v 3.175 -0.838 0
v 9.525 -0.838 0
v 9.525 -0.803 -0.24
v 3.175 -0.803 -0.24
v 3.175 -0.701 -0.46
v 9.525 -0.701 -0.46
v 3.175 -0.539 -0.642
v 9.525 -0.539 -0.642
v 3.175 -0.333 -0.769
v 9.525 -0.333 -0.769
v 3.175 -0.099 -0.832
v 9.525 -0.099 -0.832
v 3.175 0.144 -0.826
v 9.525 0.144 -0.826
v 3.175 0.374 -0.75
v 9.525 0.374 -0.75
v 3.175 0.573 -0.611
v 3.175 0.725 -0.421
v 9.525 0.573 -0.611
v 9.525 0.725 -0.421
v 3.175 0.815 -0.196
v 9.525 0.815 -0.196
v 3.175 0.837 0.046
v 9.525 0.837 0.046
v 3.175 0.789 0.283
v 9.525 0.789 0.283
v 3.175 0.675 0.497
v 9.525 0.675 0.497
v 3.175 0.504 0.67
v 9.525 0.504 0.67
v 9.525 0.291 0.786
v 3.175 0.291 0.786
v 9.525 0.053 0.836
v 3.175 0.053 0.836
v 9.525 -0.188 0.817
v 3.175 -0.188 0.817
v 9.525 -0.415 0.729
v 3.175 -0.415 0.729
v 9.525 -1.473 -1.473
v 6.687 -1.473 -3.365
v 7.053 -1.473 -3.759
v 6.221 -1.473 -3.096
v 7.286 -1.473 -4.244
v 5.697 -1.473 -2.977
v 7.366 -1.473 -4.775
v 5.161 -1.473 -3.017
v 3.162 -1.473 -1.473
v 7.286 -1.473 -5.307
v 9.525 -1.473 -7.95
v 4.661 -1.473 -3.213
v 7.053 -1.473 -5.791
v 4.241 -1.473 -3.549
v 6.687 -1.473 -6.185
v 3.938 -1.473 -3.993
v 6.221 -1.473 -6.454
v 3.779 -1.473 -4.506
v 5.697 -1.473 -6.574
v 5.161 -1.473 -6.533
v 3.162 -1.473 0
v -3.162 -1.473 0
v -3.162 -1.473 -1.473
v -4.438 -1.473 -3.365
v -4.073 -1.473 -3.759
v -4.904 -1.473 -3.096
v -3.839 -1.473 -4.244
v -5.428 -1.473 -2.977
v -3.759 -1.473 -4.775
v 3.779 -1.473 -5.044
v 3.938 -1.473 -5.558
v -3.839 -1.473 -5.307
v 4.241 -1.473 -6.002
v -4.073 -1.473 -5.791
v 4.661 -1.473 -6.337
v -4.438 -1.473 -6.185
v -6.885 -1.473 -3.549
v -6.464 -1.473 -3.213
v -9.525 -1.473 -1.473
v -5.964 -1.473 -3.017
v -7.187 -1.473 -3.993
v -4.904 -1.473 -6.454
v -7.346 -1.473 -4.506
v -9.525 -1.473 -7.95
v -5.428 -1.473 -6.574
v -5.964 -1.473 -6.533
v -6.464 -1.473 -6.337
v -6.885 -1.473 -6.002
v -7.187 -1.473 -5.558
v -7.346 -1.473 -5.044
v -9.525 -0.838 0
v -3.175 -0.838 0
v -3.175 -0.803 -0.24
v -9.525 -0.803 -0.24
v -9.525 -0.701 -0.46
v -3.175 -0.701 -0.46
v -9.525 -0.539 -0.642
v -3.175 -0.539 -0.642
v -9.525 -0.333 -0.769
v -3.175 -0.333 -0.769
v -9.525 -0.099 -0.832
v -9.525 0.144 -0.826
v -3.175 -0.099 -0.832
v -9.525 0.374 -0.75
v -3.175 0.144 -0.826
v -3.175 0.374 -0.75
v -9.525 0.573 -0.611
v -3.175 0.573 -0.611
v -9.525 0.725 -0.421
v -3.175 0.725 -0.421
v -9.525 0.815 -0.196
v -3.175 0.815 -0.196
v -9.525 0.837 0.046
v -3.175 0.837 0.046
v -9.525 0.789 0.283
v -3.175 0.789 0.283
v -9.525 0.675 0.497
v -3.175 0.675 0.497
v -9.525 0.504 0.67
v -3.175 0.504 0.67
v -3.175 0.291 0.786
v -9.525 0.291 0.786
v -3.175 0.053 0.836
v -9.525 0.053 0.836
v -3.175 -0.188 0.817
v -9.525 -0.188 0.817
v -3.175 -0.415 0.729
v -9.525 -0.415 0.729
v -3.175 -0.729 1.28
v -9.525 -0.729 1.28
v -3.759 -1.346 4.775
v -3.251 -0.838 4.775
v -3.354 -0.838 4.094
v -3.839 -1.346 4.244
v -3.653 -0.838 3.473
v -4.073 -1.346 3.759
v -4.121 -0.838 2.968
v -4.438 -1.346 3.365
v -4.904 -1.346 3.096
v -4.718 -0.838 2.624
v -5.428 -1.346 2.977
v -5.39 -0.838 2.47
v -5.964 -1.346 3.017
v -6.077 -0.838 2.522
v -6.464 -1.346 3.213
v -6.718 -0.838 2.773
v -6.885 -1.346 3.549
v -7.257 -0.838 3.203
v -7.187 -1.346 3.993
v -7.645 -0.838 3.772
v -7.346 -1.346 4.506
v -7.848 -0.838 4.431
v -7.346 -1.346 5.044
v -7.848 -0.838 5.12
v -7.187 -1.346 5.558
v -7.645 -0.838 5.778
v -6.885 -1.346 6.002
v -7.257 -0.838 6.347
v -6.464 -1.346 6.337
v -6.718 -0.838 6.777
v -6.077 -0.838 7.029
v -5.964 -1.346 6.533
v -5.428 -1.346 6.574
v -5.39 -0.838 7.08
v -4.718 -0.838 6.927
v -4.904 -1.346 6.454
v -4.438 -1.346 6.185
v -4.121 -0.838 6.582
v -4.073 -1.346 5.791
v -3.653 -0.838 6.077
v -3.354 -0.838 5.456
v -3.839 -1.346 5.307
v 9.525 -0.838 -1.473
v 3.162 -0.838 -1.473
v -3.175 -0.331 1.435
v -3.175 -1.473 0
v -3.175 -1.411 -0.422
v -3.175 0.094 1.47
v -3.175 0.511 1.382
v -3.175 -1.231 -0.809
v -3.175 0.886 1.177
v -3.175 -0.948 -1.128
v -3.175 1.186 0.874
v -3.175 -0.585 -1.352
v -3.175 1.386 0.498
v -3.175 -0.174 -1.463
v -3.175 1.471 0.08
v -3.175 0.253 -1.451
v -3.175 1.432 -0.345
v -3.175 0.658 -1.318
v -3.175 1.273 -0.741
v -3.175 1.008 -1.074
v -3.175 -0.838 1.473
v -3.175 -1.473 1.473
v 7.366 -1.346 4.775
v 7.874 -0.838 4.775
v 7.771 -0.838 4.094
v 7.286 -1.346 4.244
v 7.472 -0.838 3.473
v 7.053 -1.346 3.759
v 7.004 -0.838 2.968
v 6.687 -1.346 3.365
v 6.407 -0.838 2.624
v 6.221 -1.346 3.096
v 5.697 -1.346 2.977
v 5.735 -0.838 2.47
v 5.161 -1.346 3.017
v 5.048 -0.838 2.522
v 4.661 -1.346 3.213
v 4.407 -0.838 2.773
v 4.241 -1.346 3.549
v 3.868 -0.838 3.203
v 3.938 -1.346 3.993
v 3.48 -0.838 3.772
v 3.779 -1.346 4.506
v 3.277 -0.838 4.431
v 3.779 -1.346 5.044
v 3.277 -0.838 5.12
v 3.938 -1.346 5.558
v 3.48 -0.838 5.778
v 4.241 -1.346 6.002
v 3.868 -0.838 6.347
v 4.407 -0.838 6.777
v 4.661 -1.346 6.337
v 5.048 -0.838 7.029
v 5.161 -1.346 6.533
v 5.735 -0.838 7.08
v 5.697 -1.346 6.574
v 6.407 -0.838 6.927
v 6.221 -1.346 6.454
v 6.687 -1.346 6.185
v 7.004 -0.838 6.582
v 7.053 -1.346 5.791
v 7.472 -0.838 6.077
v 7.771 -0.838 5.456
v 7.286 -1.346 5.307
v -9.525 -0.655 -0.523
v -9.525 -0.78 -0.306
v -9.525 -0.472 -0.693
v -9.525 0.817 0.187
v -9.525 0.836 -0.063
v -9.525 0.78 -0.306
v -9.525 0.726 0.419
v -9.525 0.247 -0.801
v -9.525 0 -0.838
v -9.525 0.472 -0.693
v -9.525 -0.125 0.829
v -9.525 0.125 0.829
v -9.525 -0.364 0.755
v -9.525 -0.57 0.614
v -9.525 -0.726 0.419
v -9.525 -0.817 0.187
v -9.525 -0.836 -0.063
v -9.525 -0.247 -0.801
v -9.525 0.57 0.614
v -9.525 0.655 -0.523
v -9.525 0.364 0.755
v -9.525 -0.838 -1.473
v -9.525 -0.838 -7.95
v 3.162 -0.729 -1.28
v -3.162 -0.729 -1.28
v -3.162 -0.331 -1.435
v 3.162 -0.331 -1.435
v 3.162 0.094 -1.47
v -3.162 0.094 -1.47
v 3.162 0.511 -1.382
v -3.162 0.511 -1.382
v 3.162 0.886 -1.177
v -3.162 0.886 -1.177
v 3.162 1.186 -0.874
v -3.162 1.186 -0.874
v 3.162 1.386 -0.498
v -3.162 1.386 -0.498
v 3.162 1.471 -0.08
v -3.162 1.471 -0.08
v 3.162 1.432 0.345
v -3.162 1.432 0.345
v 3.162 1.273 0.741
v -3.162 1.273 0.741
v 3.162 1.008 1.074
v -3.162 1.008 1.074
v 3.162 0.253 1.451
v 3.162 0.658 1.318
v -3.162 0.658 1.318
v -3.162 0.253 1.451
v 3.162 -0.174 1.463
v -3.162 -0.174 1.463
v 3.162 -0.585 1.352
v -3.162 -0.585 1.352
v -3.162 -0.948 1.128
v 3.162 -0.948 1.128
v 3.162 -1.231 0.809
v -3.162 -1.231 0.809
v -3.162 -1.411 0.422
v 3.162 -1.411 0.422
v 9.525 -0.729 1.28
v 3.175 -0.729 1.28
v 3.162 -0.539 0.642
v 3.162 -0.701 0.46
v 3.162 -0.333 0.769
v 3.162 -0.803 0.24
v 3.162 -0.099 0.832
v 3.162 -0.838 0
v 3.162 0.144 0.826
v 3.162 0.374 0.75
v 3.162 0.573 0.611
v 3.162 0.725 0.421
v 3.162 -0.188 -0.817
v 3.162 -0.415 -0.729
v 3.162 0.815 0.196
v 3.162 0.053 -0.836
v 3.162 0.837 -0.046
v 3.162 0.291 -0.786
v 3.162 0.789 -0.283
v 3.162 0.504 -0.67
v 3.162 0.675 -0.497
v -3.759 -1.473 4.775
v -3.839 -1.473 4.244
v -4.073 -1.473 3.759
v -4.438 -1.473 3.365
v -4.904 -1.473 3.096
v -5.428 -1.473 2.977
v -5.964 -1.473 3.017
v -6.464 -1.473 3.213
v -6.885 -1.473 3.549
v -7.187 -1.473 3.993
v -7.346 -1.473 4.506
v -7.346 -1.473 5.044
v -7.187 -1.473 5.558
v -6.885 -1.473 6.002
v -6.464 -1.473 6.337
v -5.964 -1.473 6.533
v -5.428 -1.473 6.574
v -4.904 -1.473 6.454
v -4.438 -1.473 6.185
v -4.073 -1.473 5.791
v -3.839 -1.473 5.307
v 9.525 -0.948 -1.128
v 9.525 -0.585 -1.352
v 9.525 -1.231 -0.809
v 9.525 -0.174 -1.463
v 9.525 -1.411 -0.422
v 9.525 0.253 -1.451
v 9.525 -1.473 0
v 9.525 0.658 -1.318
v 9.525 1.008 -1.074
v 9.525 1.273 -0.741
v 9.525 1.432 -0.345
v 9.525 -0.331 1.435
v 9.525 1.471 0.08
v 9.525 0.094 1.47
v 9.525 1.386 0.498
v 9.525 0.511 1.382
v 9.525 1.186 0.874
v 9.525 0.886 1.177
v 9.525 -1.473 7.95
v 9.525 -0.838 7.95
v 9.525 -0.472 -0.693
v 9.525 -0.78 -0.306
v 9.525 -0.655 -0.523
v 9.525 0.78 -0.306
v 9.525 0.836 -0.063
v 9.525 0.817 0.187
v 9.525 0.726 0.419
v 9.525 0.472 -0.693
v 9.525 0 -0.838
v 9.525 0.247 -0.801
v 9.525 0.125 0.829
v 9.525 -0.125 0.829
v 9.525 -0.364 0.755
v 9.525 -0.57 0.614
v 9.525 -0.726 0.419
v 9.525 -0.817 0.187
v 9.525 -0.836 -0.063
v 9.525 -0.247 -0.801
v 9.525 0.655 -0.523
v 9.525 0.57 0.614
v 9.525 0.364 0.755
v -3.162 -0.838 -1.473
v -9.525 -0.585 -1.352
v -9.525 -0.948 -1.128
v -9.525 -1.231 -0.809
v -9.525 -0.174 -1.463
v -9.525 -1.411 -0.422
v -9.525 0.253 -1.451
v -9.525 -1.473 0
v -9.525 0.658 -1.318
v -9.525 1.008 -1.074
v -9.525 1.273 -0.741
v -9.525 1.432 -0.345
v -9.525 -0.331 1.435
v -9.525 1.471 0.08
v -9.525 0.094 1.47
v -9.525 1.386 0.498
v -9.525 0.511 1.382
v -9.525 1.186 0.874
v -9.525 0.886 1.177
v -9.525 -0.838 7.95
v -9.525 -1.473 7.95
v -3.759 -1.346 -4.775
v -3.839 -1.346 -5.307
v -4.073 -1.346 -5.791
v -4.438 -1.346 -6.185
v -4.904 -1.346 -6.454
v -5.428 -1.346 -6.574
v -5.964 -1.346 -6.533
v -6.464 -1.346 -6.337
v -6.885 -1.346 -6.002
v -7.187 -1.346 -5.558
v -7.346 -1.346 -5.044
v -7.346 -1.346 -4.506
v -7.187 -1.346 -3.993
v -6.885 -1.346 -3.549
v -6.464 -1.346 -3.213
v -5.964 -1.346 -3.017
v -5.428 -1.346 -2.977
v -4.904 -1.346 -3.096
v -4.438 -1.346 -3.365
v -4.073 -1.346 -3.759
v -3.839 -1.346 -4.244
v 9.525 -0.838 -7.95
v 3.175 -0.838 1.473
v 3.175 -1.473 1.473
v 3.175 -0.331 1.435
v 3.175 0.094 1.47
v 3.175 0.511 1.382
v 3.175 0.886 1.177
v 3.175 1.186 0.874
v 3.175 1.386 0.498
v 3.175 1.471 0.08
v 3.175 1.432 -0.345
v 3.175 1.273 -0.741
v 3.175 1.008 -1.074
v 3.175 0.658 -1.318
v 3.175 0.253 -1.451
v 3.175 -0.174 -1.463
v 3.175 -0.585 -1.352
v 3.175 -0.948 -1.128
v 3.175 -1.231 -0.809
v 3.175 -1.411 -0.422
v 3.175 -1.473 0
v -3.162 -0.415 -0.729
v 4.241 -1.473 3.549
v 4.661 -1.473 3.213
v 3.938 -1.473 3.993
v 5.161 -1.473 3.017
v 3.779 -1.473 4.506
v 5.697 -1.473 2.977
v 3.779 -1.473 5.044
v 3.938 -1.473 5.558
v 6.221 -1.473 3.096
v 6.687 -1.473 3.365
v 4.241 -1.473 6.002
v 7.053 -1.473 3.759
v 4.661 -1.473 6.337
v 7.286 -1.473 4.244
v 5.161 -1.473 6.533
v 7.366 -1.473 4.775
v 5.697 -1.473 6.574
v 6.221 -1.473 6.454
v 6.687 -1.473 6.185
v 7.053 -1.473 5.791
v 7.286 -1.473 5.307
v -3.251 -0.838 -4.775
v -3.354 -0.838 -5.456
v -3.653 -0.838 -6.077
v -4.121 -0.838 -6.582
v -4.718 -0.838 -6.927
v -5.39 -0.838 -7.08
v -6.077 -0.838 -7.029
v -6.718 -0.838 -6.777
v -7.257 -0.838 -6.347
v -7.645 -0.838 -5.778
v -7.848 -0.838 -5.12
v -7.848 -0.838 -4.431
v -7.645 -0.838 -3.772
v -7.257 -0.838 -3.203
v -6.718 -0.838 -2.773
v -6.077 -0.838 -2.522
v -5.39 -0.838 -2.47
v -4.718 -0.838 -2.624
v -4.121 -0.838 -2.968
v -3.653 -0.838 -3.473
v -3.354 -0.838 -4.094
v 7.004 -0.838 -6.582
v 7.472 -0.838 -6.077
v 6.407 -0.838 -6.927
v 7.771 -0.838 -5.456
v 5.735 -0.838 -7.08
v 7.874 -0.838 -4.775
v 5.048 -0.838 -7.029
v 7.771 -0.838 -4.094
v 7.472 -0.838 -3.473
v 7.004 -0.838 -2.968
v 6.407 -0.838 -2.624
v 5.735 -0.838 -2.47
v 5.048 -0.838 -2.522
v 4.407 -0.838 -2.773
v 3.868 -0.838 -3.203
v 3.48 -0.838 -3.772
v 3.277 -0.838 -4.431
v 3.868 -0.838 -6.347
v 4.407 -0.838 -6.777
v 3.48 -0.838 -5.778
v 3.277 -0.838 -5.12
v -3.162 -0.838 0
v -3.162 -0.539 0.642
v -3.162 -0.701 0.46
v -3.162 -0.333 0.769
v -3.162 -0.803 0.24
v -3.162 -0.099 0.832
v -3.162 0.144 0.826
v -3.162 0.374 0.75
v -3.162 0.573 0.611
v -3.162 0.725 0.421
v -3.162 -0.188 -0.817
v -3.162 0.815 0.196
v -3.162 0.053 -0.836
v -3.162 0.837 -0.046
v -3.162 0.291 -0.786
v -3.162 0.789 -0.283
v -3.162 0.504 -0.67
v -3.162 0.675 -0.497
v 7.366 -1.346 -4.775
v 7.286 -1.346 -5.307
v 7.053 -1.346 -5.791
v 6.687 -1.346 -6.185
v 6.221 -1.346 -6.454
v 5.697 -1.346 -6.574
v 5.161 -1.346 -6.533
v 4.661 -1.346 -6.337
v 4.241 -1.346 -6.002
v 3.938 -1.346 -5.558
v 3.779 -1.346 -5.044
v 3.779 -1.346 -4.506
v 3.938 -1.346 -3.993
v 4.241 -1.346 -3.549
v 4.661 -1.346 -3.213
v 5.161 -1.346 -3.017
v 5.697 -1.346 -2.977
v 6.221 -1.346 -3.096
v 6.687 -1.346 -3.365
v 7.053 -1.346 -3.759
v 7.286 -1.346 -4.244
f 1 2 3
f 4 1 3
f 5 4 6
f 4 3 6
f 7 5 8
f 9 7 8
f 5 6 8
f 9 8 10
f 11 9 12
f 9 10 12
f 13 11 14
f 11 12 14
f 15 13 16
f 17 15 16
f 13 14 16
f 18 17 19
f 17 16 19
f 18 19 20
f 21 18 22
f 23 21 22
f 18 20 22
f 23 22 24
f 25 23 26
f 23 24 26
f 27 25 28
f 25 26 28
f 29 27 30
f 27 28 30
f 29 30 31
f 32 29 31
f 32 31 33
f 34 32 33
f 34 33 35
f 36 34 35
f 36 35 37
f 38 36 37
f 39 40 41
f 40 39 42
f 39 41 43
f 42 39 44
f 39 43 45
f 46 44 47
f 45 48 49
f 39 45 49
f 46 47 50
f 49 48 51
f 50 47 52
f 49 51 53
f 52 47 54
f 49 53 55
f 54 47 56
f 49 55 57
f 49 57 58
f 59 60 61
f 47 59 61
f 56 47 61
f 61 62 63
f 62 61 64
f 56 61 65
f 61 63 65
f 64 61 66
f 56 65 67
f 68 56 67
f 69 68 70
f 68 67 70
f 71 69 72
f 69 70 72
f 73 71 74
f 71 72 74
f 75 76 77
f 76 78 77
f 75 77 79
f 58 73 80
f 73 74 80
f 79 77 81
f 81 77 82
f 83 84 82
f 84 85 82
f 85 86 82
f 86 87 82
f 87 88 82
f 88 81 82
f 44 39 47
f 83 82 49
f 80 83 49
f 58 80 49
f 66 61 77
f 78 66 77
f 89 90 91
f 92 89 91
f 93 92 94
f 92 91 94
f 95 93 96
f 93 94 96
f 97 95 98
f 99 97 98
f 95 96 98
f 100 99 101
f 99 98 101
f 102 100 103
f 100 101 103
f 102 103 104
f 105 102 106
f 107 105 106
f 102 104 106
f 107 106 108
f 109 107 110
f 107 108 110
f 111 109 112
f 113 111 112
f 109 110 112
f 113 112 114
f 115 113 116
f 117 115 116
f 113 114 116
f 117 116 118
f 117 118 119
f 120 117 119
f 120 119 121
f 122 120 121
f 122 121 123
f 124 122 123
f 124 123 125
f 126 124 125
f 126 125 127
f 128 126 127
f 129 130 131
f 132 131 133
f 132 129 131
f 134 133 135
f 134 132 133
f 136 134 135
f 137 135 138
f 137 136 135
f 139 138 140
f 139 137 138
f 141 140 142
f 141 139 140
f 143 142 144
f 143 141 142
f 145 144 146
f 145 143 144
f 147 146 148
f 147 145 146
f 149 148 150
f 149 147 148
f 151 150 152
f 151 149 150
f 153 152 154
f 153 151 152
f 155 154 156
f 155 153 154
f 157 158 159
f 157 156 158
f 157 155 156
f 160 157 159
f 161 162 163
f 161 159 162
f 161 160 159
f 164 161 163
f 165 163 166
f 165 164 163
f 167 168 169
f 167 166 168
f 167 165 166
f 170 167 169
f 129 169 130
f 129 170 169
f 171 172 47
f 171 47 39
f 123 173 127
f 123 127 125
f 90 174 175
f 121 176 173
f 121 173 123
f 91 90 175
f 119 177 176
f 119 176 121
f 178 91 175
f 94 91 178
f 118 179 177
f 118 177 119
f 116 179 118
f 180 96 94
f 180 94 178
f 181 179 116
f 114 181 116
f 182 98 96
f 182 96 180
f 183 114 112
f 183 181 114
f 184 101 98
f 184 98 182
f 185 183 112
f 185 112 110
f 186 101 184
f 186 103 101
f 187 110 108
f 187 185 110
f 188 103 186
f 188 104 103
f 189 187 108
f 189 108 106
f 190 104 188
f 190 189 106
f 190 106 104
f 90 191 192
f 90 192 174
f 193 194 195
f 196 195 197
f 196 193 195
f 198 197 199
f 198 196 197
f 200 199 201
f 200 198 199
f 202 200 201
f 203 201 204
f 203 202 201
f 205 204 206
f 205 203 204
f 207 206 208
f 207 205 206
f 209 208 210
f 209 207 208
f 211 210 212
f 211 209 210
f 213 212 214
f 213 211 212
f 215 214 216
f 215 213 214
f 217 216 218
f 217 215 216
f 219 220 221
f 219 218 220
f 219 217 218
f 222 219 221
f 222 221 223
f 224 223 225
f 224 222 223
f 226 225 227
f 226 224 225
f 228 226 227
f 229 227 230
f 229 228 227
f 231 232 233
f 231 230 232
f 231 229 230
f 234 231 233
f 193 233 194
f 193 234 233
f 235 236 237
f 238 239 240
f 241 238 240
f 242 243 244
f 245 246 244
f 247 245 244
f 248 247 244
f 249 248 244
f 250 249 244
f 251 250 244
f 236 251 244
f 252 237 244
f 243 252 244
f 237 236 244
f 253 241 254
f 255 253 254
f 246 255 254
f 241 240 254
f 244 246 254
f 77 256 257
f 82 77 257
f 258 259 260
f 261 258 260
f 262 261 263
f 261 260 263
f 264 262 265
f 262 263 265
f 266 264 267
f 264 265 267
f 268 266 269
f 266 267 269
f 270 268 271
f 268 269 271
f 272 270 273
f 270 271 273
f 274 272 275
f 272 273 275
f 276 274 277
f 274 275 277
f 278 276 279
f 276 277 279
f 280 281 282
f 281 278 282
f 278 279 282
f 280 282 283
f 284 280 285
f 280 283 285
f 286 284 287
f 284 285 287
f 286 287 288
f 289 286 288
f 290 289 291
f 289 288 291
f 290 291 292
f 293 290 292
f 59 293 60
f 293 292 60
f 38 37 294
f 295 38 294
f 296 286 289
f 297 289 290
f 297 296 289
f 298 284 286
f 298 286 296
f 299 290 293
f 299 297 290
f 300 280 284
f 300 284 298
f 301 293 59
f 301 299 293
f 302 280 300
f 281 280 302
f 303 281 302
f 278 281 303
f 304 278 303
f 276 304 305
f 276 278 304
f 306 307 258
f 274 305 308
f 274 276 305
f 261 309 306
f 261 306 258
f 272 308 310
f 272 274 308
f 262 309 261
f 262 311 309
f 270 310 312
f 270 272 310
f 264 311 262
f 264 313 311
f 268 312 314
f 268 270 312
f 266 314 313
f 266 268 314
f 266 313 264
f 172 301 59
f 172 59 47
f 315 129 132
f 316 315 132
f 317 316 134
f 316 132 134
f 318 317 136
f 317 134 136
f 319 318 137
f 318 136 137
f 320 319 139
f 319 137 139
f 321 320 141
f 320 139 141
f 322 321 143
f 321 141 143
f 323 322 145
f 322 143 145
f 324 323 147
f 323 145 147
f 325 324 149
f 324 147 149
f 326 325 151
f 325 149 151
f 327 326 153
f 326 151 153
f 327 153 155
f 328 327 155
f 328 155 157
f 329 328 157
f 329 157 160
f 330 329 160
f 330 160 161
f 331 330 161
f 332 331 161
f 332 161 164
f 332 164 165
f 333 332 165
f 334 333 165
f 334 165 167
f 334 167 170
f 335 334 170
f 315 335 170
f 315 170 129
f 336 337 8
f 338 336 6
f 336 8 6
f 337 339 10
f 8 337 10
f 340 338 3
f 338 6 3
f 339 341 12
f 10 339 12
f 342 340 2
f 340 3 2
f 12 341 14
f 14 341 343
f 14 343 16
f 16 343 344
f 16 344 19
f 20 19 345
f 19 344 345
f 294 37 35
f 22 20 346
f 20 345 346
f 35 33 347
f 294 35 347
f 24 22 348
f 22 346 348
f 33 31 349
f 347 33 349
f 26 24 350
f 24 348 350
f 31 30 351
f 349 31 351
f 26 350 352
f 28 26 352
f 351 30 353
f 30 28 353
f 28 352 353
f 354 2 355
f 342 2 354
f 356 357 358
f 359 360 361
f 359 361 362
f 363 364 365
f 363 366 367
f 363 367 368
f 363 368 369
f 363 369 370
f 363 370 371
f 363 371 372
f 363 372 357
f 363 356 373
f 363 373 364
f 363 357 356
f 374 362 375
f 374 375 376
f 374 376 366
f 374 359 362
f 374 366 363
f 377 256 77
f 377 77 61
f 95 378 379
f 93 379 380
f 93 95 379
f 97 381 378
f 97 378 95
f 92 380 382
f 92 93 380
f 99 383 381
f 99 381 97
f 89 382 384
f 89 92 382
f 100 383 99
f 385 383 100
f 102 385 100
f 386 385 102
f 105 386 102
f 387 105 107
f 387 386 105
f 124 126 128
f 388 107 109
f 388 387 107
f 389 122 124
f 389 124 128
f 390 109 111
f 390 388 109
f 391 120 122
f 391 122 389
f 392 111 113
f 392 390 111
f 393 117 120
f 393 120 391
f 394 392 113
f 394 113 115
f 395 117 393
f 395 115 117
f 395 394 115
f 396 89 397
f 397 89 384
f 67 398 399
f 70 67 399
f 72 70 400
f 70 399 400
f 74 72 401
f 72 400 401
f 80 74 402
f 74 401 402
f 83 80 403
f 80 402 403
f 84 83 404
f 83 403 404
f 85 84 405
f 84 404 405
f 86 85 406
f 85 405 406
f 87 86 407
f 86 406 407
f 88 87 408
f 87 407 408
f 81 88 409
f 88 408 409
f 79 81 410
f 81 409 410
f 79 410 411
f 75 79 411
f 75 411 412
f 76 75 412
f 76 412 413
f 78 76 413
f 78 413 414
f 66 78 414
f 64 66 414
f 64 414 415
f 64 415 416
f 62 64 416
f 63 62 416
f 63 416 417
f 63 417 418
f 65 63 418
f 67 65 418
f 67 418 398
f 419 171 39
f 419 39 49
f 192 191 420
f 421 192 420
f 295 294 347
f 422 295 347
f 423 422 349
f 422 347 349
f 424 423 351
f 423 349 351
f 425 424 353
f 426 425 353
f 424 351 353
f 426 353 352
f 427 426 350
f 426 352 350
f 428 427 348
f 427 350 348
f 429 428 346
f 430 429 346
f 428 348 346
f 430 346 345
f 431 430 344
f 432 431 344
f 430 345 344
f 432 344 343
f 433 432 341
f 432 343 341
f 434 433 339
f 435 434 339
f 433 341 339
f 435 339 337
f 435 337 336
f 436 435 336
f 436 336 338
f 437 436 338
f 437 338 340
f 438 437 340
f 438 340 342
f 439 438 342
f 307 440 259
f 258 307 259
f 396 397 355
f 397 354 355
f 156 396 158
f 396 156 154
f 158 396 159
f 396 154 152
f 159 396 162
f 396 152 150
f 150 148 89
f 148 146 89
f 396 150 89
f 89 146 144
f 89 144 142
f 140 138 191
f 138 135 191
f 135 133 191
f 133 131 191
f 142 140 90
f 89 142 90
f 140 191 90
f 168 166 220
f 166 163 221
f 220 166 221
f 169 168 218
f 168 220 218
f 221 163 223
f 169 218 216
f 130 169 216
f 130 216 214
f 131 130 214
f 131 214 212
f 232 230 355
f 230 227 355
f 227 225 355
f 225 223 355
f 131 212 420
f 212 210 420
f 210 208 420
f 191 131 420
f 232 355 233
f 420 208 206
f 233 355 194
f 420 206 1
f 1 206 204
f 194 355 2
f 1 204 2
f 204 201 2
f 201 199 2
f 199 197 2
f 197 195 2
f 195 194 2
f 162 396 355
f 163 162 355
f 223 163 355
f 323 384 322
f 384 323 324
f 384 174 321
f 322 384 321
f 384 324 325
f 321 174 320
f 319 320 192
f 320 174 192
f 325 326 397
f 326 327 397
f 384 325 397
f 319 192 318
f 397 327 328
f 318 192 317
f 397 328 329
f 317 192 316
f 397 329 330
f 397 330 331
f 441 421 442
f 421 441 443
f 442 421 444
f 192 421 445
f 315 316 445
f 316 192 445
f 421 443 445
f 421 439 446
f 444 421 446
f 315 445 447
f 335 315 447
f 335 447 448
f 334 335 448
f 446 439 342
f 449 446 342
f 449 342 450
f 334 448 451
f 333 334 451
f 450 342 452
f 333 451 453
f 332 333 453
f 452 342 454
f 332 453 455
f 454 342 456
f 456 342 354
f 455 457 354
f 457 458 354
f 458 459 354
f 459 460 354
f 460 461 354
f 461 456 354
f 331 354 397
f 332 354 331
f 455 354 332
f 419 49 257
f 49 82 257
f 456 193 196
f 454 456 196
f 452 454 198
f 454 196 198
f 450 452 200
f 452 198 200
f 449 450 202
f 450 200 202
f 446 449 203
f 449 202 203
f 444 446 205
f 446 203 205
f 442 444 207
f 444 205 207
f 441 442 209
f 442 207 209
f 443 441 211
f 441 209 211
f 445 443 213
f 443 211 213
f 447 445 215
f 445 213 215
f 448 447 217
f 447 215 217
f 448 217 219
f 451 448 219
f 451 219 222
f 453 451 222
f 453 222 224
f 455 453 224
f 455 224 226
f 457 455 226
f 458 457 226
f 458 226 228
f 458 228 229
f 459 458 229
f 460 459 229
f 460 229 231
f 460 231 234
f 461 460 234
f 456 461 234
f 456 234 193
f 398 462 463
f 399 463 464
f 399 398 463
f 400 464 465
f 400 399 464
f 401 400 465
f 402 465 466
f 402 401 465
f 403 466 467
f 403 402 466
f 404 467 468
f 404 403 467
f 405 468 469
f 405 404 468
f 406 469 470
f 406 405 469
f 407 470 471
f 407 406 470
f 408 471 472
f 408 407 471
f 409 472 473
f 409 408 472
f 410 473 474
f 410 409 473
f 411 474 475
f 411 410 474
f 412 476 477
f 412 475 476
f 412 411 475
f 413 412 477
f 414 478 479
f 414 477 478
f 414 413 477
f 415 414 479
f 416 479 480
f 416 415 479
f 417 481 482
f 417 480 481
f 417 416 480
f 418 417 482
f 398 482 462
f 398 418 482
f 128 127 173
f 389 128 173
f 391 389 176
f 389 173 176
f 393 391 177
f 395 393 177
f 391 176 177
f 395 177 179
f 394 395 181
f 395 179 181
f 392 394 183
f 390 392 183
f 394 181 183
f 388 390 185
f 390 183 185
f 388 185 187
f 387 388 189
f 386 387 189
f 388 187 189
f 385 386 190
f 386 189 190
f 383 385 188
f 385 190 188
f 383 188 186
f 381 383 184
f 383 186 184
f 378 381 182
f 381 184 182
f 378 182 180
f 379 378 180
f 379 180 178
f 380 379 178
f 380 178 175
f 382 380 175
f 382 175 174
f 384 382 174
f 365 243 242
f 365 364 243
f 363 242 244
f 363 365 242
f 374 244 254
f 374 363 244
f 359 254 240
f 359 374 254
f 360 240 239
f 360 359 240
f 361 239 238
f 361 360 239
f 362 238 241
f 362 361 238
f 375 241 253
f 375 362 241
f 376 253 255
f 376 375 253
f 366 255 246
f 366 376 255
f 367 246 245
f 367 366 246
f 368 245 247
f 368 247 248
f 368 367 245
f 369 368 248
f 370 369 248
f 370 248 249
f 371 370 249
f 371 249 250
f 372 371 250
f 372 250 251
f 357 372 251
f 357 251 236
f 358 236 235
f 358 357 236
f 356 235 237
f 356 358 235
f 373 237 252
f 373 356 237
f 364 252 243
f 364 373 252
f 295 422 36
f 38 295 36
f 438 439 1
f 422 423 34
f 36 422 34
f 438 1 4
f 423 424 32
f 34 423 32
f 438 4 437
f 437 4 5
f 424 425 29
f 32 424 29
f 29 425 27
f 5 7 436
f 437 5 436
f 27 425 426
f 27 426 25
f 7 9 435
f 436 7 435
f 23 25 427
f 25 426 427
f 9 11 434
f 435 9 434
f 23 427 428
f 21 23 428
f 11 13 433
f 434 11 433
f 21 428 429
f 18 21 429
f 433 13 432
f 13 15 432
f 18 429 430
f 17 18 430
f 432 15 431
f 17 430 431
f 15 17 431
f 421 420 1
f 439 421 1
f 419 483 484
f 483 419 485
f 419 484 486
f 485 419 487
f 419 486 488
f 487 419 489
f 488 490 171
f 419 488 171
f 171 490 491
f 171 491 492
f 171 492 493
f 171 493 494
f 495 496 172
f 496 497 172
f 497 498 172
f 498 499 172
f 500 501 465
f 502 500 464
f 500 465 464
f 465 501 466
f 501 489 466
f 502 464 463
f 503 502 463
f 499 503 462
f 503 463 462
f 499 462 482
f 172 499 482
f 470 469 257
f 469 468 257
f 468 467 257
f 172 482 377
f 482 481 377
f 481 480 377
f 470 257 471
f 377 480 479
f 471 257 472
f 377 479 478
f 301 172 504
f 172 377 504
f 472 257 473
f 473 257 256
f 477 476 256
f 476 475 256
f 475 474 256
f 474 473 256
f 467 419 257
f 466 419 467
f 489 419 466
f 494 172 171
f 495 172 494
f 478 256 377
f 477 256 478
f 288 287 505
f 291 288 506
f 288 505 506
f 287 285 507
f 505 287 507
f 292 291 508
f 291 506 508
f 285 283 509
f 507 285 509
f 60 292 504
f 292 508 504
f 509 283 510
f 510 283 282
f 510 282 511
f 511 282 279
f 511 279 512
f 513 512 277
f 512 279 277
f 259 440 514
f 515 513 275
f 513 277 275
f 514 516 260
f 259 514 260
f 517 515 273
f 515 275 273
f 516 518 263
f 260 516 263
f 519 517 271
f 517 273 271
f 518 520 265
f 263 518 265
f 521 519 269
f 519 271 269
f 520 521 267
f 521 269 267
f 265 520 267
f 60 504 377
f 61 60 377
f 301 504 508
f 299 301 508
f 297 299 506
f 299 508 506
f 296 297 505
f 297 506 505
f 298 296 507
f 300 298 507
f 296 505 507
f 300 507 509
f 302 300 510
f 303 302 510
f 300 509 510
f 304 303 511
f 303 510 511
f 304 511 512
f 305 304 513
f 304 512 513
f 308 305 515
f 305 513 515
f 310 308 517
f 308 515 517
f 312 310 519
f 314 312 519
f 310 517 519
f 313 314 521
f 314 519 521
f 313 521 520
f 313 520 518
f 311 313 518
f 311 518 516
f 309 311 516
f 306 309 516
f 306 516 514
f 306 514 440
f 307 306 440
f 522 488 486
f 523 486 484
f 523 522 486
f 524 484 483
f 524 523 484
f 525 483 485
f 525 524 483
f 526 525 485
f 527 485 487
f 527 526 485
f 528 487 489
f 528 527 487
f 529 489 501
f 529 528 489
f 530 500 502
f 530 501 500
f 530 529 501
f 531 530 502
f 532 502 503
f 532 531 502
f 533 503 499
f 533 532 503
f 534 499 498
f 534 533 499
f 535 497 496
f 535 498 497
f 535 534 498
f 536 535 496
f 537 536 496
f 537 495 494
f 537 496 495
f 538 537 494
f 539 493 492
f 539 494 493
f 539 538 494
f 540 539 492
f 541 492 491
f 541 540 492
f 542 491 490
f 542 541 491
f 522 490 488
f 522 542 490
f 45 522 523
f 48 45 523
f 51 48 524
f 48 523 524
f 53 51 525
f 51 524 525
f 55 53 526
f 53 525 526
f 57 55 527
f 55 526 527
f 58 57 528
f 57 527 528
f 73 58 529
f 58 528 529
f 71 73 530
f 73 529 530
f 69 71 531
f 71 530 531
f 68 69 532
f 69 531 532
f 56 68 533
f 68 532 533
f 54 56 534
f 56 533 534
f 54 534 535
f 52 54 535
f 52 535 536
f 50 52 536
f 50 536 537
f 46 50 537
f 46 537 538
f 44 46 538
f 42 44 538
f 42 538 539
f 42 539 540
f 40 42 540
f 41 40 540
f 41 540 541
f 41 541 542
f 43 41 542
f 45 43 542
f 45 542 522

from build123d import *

# Parameters (mm, degrees)
BOSS_EXTRUDE1_DEPTH     = 9.525
CIRPATTERN1_COUNT       = 2
SKETCH4_W               = 6.35
SKETCH4_H               = 2.9464
CUT_EXTRUDE1_DEPTH      = 2.4732
CUT_EXTRUDE1_DEPTH_BACK = 2.4732
SKETCH10_W              = 6.3627
SKETCH10_H              = 2.9464
CUT_EXTRUDE4_DEPTH      = 2.4732
CUT_EXTRUDE4_DEPTH_BACK = 2.4732
SKETCH5_R               = 2.3114
CUT_EXTRUDE2_DEPTH      = 1.635
CUT_EXTRUDE2_TAPER      = 45
SKETCH9_R               = 1.8034
CUT_EXTRUDE3_DEPTH      = 2.4732
CUT_EXTRUDE3_DEPTH_BACK = 2.4732001
SKETCH11_R              = 2.3114
CUT_EXTRUDE5_DEPTH      = 1.635
CUT_EXTRUDE5_TAPER      = 45
SKETCH12_R              = 1.8034
CUT_EXTRUDE6_DEPTH      = 3.3114
CUT_EXTRUDE6_DEPTH_BACK = 1.6350001
SKETCH6_R               = 0.8382
BOSS_EXTRUDE2_DEPTH     = 9.525


with BuildPart() as part:
    # Sketch3 → Boss-Extrude1 (new body, symmetric)
    with BuildSketch(Plane(origin=(0, 0, 0), x_dir=(0, 0, -1), z_dir=(1, 0, 0))):
        with BuildLine():
            Line((0, -1.4732), (-7.9502, -1.4732))
            Line((-7.9502, -1.4732), (-7.9502, -0.8382))
            Line((-7.9502, -0.8382), (0, -0.8382))
            ThreePointArc((0, -0.8382), (0.421388638, 0.724576328), (-0.728533124, -0.414510226))
            Line((-0.728533124, -0.414510226), (-1.280452157, -0.728533124))
            ThreePointArc((-1.280452157, -0.728533124), (0.740622455, 1.273497789), (0, -1.4732))
        make_face()
    extrude(amount=BOSS_EXTRUDE1_DEPTH, both=True)


with BuildPart() as cirpattern1_1:
    # CirPattern1: pattern copy
    add(part.part.rotate(Axis((0, 0, 0), (0, 1, 0)), 1 * 360 / CIRPATTERN1_COUNT))

    # Sketch10 → Cut-Extrude4 (cut, two sides)
    with BuildSketch(Plane(origin=(0, 0, 0), x_dir=(1, 0, 0), z_dir=(0, 1, 0))) as cut_extrude4_sk:
        with Locations((-6.34365, 0)):
            Rectangle(SKETCH10_W, SKETCH10_H)
        with Locations((6.34365, 0)):
            Rectangle(SKETCH10_W, SKETCH10_H)
    extrude(amount=CUT_EXTRUDE4_DEPTH, mode=Mode.SUBTRACT)
    extrude(cut_extrude4_sk.sketch, amount=-CUT_EXTRUDE4_DEPTH_BACK, mode=Mode.SUBTRACT)

    # Sketch11 → Cut-Extrude5 (cut, through all)
    with BuildSketch(Plane(origin=(0, -0.8382, 0), x_dir=(1, 0, 0), z_dir=(0, 1, 0))):
        with Locations((5.5626, 4.7752)):
            Circle(SKETCH11_R)
        with Locations((-5.5626, 4.7752)):
            Circle(SKETCH11_R)
    extrude(amount=-CUT_EXTRUDE5_DEPTH, taper=CUT_EXTRUDE5_TAPER, mode=Mode.SUBTRACT)

    # Sketch12 → Cut-Extrude6 (cut, two sides)
    with BuildSketch(Plane(origin=(0, -0.8382, 0), x_dir=(1, 0, 0), z_dir=(0, 1, 0))) as cut_extrude6_sk:
        with Locations((-5.5626, 4.7752)):
            Circle(SKETCH12_R)
        with Locations((5.5626, 4.7752)):
            Circle(SKETCH12_R)
    extrude(amount=CUT_EXTRUDE6_DEPTH, mode=Mode.SUBTRACT)
    extrude(cut_extrude6_sk.sketch, amount=-CUT_EXTRUDE6_DEPTH_BACK, mode=Mode.SUBTRACT)


with BuildPart() as part_1:
    add(part.part)

    # Sketch4 → Cut-Extrude1 (cut, two sides)
    with BuildSketch(Plane(origin=(0, 0, 0), x_dir=(1, 0, 0), z_dir=(0, 1, 0))) as cut_extrude1_sk:
        Rectangle(SKETCH4_W, SKETCH4_H)
    extrude(amount=CUT_EXTRUDE1_DEPTH, mode=Mode.SUBTRACT)
    extrude(cut_extrude1_sk.sketch, amount=-CUT_EXTRUDE1_DEPTH_BACK, mode=Mode.SUBTRACT)

    # Sketch5 → Cut-Extrude2 (cut, through all)
    with BuildSketch(Plane(origin=(0, -0.8382, 0), x_dir=(1, 0, 0), z_dir=(0, 1, 0))):
        with Locations((5.5626, -4.7752)):
            Circle(SKETCH5_R)
        with Locations((-5.5626, -4.7752)):
            Circle(SKETCH5_R)
    extrude(amount=-CUT_EXTRUDE2_DEPTH, taper=CUT_EXTRUDE2_TAPER, mode=Mode.SUBTRACT)

    # Sketch9 → Cut-Extrude3 (cut, two sides)
    with BuildSketch(Plane(origin=(0, 0, 0), x_dir=(1, 0, 0), z_dir=(0, 1, 0))) as cut_extrude3_sk:
        with Locations((5.5626, -4.7752)):
            Circle(SKETCH9_R)
        with Locations((-5.5626, -4.7752)):
            Circle(SKETCH9_R)
    extrude(amount=CUT_EXTRUDE3_DEPTH, mode=Mode.SUBTRACT)
    extrude(cut_extrude3_sk.sketch, amount=-CUT_EXTRUDE3_DEPTH_BACK, mode=Mode.SUBTRACT)


with BuildPart() as body_3:
    # Sketch6 → Boss-Extrude2 (new body, symmetric)
    with BuildSketch(Plane(origin=(0, 0, 0), x_dir=(0, 0, -1), z_dir=(1, 0, 0))):
        Circle(SKETCH6_R)
    extrude(amount=BOSS_EXTRUDE2_DEPTH, both=True)


solid = Compound([cirpattern1_1.part, part_1.part, body_3.part])
